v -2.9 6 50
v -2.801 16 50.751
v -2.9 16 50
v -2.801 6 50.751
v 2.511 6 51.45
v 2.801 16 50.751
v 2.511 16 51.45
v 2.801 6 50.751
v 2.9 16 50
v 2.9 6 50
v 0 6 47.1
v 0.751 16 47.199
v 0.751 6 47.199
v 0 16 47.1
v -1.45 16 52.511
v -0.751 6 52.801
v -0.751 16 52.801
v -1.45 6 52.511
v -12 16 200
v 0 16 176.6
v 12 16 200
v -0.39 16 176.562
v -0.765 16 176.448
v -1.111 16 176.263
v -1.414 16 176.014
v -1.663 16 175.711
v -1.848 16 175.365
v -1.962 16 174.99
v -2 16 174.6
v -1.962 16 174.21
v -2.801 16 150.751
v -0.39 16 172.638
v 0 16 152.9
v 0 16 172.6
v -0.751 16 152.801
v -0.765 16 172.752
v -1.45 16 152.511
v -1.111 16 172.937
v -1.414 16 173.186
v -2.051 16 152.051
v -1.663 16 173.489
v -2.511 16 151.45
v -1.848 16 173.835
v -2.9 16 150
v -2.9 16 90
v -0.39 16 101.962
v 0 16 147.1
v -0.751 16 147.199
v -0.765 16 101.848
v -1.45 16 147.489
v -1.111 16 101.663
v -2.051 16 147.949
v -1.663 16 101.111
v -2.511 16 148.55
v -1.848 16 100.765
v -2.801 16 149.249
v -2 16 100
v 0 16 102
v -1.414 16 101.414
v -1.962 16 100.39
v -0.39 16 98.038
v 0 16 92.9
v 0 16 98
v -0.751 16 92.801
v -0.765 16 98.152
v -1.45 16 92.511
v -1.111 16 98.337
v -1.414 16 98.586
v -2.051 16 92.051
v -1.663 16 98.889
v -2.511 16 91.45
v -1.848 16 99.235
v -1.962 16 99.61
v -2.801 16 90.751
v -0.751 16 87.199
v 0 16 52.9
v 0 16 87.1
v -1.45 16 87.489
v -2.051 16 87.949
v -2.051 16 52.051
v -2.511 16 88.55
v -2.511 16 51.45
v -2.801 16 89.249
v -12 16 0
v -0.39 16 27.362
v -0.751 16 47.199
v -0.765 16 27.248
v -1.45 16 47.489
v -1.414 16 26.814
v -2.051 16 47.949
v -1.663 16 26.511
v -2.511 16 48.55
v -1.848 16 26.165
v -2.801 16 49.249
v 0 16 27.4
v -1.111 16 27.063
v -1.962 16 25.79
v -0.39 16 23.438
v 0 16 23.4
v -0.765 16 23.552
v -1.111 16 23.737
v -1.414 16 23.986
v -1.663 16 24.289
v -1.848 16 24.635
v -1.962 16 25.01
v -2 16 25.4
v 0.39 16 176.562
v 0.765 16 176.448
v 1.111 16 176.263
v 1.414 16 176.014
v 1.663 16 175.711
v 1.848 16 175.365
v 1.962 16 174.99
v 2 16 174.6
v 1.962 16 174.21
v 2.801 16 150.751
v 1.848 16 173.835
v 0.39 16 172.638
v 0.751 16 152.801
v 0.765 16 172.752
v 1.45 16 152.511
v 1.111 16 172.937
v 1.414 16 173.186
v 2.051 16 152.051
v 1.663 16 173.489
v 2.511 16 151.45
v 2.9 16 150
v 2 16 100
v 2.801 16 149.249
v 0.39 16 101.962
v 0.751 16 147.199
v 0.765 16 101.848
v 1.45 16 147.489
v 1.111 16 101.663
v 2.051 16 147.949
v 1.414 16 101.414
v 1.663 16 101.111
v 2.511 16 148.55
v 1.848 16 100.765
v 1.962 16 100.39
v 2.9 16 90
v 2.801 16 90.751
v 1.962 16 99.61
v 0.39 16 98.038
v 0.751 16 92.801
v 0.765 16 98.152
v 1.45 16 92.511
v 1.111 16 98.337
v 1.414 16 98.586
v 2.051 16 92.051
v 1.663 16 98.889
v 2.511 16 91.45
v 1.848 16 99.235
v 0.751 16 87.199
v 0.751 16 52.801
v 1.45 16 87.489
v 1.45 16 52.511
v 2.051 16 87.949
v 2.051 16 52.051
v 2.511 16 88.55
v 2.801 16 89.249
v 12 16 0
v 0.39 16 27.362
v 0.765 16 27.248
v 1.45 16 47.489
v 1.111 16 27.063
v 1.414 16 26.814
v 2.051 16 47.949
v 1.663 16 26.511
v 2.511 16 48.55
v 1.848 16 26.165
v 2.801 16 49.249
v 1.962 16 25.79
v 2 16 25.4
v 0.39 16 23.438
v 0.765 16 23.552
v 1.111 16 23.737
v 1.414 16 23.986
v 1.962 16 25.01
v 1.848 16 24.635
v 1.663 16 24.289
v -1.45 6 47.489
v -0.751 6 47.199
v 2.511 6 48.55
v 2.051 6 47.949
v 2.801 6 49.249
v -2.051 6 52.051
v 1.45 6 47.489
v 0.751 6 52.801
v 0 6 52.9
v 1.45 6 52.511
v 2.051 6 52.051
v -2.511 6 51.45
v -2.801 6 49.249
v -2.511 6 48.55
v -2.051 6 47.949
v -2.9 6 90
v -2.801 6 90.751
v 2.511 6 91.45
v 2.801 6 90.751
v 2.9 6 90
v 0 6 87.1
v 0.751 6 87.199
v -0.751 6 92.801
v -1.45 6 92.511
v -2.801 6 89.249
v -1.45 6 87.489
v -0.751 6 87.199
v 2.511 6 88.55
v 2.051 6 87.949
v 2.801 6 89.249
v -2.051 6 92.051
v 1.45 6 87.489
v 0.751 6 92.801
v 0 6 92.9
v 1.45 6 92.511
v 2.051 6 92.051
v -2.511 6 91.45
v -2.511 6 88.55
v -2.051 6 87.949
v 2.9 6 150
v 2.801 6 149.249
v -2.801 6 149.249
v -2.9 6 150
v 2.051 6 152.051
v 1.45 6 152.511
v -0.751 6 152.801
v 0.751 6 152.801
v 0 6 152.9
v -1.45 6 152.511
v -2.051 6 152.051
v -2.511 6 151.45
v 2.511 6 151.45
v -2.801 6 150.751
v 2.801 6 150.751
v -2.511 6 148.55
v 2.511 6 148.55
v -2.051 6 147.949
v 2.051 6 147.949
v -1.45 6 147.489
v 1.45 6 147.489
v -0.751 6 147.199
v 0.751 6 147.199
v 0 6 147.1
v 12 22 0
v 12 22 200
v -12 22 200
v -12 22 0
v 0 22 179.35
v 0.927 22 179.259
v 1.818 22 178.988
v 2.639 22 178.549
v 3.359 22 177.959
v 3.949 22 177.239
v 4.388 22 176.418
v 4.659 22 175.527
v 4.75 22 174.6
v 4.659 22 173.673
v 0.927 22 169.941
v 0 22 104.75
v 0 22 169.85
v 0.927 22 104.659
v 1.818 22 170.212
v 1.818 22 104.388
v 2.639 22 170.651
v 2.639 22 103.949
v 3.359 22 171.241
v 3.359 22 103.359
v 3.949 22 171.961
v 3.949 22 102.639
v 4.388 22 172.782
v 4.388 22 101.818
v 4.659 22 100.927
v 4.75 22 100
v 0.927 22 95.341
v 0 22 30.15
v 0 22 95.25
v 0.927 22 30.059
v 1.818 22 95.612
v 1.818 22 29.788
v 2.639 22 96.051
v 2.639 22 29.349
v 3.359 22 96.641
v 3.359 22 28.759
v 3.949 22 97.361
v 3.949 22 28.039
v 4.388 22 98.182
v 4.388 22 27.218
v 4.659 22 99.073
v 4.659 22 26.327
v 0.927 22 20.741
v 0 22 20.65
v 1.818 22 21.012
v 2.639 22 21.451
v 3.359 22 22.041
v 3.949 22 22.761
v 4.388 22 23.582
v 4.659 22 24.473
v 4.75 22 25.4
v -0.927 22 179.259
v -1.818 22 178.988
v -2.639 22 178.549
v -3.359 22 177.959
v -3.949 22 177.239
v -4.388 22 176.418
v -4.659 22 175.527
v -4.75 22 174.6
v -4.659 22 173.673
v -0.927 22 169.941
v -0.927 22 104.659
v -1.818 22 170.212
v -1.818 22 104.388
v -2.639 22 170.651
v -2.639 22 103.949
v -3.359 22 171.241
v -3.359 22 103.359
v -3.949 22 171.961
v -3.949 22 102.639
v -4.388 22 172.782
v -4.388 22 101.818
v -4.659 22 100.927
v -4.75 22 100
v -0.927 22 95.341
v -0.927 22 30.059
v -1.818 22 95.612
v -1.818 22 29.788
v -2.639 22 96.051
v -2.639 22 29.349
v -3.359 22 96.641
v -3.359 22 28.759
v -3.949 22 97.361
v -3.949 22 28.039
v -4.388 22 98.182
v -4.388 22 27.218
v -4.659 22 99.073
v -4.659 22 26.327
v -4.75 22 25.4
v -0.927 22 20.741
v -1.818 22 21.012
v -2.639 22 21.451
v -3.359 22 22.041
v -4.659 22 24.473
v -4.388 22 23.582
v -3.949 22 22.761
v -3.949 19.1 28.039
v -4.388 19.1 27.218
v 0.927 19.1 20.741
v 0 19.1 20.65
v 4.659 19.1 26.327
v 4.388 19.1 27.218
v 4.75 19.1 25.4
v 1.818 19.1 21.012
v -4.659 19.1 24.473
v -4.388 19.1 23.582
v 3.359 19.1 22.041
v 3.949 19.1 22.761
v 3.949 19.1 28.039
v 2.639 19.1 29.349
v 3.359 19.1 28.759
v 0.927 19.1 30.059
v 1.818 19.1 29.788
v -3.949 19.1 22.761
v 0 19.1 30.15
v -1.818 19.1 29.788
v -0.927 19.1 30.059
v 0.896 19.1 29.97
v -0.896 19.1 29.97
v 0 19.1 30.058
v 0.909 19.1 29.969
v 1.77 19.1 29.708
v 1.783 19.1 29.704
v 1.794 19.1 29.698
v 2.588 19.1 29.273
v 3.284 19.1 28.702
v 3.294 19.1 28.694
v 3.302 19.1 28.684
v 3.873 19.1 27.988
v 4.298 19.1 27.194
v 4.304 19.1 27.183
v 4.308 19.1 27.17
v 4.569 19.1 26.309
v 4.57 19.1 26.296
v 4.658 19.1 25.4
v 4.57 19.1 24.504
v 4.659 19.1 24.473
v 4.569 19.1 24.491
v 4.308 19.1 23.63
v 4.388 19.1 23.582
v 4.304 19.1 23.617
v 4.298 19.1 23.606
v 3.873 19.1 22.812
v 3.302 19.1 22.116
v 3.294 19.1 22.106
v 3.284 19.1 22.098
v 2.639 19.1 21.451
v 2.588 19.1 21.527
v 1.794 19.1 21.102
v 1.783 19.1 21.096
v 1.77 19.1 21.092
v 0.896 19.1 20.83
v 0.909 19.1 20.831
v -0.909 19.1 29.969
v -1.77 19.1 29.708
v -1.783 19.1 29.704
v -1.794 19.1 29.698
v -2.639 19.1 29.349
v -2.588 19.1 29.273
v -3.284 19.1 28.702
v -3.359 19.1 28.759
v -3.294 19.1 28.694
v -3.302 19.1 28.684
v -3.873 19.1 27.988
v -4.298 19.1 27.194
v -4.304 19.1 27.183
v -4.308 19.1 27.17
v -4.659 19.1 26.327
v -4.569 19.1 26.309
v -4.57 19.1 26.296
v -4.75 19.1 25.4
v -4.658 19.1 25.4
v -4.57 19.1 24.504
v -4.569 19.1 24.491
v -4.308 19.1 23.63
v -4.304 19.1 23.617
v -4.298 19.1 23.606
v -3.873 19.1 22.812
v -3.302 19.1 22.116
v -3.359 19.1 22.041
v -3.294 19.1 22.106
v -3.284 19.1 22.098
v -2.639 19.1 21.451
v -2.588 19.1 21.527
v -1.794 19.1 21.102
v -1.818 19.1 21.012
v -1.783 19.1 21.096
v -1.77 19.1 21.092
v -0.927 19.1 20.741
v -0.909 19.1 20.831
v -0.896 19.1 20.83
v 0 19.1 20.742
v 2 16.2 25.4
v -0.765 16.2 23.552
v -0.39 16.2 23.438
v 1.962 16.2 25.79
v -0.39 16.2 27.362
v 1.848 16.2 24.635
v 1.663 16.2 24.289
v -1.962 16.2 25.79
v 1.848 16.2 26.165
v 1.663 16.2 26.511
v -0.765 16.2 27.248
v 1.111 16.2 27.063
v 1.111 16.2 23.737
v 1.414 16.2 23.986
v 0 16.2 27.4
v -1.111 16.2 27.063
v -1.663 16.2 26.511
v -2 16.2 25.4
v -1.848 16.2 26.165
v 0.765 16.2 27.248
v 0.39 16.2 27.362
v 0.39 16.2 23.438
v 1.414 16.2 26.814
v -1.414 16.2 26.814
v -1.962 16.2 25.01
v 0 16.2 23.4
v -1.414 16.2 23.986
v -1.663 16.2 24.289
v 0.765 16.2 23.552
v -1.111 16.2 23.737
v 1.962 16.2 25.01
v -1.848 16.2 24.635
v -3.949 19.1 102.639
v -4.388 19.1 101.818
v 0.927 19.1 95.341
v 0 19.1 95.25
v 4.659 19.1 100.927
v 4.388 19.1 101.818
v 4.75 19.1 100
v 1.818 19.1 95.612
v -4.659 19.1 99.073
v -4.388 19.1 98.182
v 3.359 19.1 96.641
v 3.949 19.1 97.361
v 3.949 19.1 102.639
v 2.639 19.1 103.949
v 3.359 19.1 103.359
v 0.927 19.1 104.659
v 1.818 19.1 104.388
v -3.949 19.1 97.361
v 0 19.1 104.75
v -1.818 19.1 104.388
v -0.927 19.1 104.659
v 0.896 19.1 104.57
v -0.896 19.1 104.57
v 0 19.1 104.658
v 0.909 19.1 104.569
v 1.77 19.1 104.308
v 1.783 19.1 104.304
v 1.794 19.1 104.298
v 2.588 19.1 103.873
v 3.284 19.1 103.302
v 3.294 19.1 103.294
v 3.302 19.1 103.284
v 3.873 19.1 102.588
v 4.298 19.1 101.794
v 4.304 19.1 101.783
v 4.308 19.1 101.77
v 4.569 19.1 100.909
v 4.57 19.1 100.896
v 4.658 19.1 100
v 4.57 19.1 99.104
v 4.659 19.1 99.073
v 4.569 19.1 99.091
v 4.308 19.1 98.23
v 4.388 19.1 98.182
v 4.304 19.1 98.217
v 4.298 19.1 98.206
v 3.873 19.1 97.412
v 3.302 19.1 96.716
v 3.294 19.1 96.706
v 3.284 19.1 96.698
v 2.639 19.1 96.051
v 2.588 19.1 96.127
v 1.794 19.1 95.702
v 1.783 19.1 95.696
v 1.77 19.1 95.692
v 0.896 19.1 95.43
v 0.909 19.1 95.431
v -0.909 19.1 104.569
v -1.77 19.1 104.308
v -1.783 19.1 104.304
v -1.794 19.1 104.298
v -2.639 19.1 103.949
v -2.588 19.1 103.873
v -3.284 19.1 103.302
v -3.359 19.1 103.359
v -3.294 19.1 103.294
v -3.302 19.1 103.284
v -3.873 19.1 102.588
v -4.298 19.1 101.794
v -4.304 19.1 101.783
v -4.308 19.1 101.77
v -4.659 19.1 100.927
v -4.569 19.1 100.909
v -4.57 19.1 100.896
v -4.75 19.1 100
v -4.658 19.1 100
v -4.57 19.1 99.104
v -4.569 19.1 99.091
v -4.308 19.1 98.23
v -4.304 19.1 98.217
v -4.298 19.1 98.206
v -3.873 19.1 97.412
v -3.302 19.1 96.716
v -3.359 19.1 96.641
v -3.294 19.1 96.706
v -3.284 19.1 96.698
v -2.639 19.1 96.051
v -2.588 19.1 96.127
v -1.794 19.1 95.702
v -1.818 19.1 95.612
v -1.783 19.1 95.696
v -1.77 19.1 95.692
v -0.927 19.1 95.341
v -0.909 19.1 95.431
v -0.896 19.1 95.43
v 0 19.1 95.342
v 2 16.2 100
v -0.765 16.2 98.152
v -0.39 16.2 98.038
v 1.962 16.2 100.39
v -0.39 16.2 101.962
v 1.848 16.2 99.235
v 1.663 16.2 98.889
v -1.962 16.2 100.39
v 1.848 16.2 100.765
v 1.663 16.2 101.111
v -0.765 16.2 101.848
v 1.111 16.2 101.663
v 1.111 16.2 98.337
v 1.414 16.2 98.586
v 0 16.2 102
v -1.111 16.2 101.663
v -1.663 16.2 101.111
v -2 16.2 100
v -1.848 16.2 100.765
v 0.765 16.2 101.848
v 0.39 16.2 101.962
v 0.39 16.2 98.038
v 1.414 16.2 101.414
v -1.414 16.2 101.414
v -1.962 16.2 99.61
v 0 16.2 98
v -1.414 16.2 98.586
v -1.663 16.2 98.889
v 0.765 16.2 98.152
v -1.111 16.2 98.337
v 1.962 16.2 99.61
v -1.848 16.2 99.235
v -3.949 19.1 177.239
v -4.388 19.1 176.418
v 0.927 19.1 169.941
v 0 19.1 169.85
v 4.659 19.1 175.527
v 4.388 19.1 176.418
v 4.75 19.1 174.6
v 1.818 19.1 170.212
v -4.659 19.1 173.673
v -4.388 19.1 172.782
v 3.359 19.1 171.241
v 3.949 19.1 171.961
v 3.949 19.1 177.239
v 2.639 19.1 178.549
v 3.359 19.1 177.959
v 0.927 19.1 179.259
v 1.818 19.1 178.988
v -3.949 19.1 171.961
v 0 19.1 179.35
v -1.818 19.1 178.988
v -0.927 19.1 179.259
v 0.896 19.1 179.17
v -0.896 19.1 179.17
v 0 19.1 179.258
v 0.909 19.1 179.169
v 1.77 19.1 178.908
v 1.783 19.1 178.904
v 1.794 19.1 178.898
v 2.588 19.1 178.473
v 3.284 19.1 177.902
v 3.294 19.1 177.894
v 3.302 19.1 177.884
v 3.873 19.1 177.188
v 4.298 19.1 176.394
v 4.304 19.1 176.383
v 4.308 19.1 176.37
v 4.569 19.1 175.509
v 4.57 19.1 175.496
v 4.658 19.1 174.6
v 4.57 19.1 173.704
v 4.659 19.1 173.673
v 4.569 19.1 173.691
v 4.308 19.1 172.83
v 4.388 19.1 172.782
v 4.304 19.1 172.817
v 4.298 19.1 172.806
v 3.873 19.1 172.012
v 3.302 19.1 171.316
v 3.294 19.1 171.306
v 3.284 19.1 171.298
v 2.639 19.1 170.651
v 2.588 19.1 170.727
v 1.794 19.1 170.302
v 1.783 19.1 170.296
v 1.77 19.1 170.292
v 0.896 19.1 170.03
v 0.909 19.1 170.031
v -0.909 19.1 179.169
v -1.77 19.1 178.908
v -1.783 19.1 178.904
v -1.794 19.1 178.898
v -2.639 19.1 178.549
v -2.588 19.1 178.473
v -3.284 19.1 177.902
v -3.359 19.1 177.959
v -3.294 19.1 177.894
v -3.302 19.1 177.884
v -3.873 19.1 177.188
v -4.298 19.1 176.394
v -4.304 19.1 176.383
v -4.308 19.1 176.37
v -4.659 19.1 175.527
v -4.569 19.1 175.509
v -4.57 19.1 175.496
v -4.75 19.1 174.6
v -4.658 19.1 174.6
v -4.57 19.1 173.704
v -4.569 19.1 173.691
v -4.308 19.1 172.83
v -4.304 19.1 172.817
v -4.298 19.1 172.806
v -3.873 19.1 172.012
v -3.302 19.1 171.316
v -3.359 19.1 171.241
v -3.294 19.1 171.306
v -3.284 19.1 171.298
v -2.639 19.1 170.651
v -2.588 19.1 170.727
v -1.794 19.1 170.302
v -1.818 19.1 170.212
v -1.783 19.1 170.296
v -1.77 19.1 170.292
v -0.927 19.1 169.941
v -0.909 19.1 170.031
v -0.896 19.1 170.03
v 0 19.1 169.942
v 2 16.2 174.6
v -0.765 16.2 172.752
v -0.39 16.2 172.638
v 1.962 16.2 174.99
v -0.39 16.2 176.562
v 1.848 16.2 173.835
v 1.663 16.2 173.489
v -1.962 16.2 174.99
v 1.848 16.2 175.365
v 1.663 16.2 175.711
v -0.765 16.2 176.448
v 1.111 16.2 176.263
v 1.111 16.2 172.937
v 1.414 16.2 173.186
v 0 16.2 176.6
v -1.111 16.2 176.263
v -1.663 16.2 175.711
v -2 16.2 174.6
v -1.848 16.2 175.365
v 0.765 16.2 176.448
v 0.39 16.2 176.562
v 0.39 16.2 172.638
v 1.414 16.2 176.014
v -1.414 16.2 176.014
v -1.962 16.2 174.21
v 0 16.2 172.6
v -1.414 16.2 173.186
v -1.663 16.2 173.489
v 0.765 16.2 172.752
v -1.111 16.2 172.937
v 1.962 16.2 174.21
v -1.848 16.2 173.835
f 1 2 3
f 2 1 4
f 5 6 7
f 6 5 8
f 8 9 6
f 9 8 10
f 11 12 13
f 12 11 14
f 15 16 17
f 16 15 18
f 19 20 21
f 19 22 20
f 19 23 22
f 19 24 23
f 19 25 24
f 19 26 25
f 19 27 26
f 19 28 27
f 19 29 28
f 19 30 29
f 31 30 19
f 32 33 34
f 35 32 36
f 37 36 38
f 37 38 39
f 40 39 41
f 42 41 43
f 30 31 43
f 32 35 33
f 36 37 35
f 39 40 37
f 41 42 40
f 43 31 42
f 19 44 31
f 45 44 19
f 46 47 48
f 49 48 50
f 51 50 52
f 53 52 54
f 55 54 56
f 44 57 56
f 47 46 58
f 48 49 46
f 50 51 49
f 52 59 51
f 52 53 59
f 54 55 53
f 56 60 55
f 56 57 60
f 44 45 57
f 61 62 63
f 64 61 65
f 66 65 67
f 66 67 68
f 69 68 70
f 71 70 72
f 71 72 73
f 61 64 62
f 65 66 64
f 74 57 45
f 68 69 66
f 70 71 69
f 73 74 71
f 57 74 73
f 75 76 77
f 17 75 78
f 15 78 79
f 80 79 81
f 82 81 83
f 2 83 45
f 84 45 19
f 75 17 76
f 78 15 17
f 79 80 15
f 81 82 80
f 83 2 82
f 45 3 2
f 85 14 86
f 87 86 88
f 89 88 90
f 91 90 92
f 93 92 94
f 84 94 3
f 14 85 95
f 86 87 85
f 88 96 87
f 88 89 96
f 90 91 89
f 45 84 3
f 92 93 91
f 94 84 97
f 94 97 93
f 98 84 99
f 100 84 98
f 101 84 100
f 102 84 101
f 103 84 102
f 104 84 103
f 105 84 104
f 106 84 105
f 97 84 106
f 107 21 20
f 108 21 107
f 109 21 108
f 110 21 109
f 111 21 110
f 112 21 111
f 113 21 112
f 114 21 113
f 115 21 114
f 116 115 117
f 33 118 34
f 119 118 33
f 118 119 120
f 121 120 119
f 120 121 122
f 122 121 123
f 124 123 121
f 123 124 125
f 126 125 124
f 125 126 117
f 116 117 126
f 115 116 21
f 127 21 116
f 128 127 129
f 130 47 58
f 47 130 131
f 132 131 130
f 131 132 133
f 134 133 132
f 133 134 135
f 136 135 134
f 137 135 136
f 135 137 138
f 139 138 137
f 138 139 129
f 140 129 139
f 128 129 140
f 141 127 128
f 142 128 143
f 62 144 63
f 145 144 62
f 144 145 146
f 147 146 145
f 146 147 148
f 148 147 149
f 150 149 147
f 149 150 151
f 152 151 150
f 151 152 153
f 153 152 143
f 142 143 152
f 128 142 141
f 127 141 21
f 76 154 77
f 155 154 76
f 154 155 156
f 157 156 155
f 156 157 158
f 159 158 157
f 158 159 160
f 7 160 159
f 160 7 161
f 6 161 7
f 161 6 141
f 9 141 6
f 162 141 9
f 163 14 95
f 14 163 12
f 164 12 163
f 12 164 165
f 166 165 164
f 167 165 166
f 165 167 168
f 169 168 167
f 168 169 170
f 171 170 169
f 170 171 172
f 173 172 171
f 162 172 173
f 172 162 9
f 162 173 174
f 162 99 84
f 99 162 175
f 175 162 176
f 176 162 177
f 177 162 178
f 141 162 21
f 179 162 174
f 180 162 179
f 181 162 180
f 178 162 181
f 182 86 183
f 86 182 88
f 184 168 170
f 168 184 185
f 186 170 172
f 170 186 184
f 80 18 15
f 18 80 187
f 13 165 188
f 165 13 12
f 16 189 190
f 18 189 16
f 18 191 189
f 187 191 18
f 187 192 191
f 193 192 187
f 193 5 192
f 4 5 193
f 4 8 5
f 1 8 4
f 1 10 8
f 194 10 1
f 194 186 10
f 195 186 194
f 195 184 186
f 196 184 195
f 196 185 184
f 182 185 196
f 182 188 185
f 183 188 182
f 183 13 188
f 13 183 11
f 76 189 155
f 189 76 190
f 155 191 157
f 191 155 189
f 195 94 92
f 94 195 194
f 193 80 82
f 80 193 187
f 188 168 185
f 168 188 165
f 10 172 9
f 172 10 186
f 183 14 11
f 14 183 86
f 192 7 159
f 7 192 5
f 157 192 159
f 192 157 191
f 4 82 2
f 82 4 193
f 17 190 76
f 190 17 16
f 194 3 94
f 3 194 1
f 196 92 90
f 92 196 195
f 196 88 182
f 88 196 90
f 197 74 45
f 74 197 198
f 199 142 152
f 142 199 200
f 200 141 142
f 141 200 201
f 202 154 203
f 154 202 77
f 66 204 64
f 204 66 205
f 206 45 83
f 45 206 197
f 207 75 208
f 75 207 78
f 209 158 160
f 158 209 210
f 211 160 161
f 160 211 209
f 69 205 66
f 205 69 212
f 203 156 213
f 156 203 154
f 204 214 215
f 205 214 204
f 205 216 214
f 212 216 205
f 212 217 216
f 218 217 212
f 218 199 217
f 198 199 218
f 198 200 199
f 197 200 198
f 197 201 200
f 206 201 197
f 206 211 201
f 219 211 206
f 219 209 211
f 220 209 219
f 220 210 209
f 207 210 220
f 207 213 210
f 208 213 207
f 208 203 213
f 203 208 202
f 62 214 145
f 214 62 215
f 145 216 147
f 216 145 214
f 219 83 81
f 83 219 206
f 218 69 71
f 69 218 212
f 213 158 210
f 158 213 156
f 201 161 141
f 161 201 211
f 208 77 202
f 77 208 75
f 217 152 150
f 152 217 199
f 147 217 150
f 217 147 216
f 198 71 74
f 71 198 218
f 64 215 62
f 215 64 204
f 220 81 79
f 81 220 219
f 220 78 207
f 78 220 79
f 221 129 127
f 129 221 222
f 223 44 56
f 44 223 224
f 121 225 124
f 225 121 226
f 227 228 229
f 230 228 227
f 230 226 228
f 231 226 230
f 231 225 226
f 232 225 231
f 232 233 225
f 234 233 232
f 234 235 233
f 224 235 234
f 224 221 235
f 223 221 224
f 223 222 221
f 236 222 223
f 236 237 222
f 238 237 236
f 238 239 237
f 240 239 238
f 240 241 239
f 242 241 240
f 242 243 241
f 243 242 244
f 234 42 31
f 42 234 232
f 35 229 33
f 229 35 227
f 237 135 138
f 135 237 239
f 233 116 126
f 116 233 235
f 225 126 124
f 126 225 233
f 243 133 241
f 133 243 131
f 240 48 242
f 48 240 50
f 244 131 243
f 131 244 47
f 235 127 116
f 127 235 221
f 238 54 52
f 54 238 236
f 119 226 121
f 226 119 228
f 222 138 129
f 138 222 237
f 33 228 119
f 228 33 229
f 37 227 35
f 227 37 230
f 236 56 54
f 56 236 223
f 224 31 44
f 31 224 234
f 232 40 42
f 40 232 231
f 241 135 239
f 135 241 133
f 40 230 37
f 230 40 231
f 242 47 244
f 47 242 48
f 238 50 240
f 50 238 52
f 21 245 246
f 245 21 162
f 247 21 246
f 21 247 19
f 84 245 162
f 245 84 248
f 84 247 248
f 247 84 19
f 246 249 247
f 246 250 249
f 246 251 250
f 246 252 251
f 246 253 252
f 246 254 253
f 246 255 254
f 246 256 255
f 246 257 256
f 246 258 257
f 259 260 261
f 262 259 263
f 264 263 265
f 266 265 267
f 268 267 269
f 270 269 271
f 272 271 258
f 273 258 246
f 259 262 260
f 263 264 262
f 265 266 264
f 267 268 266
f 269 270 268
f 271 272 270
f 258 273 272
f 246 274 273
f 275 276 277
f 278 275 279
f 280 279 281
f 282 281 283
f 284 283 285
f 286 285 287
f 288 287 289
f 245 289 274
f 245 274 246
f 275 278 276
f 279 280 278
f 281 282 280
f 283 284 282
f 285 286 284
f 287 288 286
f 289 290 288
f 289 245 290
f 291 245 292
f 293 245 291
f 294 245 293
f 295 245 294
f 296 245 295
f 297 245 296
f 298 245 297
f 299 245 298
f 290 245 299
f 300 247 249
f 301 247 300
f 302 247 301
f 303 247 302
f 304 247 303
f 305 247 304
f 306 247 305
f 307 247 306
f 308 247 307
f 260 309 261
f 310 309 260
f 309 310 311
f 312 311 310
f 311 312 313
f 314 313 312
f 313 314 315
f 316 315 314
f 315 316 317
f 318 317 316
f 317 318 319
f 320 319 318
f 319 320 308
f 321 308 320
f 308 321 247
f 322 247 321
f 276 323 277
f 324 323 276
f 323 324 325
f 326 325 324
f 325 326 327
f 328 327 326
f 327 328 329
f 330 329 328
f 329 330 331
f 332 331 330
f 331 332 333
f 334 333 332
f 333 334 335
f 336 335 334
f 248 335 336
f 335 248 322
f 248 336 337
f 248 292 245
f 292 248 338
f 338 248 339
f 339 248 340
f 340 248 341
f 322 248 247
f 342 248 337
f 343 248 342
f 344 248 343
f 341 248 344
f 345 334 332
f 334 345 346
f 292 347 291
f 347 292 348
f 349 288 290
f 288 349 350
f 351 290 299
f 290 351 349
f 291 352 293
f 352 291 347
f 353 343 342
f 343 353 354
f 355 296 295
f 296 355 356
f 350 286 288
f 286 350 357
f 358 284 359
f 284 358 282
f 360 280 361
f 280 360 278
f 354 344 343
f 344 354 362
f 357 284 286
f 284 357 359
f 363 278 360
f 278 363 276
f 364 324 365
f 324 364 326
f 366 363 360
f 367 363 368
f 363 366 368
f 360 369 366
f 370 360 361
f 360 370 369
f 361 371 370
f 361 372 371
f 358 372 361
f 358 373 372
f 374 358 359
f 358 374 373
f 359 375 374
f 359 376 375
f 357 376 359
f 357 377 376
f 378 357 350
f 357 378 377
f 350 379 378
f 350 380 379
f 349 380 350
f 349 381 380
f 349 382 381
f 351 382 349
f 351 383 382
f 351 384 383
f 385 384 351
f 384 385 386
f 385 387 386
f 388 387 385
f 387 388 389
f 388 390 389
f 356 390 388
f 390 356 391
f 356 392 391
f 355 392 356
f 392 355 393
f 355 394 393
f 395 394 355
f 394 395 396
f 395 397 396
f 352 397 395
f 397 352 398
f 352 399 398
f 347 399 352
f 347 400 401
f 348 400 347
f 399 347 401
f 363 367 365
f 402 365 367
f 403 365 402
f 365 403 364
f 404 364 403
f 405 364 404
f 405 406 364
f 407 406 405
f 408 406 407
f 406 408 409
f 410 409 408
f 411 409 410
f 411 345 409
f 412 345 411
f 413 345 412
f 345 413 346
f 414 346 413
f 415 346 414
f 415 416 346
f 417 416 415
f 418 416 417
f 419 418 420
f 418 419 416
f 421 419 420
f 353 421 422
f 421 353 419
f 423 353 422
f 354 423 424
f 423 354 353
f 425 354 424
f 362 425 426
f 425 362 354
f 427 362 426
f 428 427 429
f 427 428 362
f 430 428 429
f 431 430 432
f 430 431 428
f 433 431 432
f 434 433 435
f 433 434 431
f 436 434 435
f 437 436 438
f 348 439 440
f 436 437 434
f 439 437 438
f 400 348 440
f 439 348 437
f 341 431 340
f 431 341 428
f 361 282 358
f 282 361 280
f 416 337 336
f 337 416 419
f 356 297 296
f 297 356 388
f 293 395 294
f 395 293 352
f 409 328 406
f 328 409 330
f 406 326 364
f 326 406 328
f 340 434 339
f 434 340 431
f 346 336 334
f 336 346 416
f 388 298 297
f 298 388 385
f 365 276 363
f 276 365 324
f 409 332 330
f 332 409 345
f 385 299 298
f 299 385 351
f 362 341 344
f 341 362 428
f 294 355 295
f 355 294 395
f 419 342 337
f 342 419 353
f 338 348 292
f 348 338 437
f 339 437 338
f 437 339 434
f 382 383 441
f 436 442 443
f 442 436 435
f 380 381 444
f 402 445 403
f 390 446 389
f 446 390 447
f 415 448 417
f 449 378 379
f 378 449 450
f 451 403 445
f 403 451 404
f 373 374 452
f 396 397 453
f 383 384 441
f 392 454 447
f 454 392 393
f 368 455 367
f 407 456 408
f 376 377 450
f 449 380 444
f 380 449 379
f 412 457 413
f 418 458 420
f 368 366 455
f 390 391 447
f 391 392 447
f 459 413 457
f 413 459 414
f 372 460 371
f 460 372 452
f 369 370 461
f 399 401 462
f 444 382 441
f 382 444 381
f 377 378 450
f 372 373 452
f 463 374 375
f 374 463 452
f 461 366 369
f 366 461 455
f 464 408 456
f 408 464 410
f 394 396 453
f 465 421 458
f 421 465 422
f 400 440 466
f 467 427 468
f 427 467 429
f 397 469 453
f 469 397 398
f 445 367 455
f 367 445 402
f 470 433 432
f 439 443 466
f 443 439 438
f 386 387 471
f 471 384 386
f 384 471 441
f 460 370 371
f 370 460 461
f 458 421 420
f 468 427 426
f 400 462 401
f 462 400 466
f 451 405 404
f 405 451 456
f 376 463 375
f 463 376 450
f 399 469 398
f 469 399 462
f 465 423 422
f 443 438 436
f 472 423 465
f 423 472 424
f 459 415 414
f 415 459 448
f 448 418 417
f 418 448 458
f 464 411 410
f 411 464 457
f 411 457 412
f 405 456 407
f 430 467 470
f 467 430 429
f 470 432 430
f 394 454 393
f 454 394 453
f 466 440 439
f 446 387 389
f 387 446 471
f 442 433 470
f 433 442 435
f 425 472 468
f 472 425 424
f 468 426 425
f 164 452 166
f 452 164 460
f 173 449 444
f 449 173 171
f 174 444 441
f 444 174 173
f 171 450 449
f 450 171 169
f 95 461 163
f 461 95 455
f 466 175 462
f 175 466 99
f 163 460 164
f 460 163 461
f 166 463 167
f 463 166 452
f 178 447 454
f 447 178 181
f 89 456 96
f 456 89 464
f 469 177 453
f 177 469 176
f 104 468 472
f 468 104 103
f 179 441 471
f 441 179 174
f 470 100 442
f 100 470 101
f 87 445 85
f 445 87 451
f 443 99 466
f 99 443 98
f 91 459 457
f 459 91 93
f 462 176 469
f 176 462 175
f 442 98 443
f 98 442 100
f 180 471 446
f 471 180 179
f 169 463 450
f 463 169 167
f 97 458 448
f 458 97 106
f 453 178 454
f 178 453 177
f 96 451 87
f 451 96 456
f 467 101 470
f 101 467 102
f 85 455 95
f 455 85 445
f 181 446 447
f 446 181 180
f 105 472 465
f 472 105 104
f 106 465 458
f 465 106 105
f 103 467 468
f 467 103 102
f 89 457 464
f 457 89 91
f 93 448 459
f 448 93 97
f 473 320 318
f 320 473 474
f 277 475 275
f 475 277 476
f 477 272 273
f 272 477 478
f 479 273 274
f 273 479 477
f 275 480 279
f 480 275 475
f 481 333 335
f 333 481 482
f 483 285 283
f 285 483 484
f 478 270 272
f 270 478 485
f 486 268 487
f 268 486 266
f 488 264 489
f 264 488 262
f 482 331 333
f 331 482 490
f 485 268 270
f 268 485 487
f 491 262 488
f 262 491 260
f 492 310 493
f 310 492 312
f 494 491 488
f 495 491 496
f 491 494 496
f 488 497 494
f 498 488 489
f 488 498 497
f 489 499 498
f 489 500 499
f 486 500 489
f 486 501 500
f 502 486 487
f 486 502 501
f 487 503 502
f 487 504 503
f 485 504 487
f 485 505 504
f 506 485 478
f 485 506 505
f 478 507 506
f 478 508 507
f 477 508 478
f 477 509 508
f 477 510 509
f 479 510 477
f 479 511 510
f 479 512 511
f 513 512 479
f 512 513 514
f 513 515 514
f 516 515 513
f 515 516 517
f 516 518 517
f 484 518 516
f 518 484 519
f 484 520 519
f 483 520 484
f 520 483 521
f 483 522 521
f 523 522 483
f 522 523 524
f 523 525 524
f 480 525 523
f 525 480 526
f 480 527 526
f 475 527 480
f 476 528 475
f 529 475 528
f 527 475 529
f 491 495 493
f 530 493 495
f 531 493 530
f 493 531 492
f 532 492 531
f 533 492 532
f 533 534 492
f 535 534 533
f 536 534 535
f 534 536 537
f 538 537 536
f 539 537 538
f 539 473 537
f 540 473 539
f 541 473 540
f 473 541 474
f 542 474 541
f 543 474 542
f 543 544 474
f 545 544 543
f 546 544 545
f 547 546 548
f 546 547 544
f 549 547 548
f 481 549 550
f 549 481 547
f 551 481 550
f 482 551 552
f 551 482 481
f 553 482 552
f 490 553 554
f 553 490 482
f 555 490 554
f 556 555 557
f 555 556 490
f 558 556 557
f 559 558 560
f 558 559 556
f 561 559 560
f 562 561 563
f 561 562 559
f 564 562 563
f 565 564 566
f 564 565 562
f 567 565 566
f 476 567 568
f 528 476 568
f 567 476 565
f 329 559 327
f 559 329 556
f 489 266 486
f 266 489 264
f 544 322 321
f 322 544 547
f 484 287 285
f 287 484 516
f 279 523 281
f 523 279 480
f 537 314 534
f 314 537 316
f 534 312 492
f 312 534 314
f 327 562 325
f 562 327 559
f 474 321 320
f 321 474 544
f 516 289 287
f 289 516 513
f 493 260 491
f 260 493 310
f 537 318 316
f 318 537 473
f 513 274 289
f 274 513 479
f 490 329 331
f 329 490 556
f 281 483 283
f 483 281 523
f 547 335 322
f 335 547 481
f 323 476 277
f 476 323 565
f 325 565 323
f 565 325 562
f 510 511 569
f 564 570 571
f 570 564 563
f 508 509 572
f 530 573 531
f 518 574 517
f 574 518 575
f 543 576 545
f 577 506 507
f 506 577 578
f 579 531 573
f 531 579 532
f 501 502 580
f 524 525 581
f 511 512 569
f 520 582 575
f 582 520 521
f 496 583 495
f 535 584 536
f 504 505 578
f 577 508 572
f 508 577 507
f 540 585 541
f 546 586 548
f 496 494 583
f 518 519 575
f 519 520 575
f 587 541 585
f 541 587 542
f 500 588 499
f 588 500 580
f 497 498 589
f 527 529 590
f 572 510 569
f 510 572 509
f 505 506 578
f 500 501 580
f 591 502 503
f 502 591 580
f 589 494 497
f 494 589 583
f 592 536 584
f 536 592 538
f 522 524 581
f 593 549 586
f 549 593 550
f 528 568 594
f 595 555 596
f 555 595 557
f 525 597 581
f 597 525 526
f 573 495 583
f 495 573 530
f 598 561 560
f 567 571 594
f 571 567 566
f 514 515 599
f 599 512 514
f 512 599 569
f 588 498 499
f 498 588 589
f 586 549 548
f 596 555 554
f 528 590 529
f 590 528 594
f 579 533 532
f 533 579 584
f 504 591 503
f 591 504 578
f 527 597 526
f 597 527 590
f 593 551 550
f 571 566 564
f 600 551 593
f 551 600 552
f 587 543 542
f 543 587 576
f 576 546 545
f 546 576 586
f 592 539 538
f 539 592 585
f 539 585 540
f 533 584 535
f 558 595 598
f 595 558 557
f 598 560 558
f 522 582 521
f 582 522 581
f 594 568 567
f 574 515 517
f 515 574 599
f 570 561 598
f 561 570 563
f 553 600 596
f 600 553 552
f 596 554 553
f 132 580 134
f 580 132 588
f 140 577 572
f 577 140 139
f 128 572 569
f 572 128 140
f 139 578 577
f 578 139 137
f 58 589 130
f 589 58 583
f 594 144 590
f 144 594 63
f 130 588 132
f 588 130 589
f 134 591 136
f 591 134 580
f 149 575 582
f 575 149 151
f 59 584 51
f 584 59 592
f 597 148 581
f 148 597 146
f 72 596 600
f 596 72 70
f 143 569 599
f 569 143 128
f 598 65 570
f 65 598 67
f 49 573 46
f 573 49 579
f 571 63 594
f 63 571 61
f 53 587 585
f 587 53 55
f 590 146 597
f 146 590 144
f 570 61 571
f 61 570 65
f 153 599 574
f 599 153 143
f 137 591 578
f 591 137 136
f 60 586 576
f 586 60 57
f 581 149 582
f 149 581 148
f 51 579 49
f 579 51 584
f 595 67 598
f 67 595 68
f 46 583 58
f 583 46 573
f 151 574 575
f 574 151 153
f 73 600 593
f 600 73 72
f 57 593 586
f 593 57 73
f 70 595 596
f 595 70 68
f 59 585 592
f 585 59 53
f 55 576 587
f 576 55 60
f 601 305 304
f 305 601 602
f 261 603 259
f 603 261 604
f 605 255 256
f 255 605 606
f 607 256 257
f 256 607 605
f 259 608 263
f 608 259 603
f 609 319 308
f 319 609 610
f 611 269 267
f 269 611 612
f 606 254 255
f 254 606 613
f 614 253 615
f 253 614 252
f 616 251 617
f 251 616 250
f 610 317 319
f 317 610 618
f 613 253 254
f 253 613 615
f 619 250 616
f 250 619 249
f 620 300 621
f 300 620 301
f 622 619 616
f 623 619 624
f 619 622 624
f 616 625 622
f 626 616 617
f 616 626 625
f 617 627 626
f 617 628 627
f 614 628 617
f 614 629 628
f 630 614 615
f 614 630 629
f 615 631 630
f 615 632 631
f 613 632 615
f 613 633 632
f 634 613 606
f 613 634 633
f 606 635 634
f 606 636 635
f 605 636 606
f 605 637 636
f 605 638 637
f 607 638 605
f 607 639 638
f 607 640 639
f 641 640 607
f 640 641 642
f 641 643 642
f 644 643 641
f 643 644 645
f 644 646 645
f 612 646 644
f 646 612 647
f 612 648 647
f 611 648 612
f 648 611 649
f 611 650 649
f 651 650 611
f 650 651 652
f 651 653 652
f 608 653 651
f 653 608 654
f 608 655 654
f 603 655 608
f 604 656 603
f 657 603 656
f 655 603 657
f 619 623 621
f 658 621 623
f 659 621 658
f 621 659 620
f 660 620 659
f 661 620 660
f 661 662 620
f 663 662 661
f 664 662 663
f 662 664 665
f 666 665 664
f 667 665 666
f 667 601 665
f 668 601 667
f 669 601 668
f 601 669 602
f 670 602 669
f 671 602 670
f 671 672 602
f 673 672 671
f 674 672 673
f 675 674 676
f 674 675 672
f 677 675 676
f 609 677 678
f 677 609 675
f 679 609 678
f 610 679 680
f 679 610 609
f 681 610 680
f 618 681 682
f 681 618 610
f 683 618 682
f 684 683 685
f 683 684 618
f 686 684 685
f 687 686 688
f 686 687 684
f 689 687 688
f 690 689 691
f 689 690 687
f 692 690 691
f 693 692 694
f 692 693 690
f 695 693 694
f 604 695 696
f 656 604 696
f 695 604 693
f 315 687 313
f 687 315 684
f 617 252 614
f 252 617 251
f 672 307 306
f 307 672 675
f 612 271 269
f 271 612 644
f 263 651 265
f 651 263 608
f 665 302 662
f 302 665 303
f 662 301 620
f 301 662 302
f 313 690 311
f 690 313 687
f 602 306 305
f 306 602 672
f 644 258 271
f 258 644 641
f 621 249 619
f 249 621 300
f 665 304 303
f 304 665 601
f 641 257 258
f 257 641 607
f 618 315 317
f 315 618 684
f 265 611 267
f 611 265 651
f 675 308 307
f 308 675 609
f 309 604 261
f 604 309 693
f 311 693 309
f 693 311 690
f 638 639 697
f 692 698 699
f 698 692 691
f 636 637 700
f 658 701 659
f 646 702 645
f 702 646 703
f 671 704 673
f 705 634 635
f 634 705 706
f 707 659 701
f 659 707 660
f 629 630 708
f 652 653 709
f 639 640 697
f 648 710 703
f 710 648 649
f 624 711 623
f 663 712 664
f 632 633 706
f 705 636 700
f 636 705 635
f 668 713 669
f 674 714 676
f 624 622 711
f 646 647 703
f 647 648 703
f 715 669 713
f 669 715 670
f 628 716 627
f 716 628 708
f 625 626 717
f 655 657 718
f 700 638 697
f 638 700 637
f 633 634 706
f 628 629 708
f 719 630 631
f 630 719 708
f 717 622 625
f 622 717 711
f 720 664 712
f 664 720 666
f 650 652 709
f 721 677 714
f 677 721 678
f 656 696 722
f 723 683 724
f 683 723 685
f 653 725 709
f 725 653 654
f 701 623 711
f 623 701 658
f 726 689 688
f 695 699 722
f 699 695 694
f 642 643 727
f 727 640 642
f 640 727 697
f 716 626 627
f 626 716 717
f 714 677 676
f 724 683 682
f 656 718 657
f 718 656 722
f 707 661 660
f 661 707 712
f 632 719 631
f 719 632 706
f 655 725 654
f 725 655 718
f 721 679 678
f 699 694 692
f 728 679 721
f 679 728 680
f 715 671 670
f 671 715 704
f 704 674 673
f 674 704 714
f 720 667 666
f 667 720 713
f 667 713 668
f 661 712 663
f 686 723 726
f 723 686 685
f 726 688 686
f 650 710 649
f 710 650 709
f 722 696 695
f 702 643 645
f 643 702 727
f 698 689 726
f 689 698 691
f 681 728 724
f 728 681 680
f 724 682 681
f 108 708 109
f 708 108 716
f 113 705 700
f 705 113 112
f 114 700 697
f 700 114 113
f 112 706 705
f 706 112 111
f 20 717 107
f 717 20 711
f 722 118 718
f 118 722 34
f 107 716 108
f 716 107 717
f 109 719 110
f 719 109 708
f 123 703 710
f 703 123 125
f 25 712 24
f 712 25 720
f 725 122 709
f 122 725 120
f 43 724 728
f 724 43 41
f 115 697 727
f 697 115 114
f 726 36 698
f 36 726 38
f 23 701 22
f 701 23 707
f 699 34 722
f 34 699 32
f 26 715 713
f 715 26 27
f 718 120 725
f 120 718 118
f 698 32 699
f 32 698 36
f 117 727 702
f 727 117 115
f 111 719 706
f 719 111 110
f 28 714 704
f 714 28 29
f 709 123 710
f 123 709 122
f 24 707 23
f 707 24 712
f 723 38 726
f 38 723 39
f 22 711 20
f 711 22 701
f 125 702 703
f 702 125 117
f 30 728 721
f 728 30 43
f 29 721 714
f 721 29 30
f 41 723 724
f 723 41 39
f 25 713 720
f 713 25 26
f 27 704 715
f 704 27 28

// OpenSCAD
// PROJECT: 5kg Vertical Panel Actuator
// PART 2: Top Track (Modified with 3mm Deep Recess)

segment_length = 200; 
top_width = 24;         
web_width = 12.4;       
top_flange_thick = 6;

difference() {
    union() {
        // --- ORIGINAL GEOMETRY ---
        // Top Slider Surface
        translate([-top_width/2, 16, 0]) 
            cube([top_width, top_flange_thick, segment_length]);
            
        // Upper half of Central Web
        translate([-web_width/2, 16.0, 0]) 
            cube([web_width, 1, segment_length]);

// 5.8mm DOWELs - 5x Deeper (25mm)
for(z = [50, 90, 150]) {
    translate([0, 16.0, z]) 
        rotate([90, 0, 0]) 
        cylinder(d=5.8, h=10, $fn=24);
}
    }

    // --- NEW: DEEP MOUNTING HOLES ---
    for(z = [25.4, 100, 174.6]) {
        translate([0, 22.1, z]) rotate([90, 0, 0]) {
            
            // 1. Main 4mm Through Hole
            cylinder(d=4, h=30, $fn=32); 
            
            // 2. Extra Deep Recess
            // This creates a 3mm deep straight 'well' before the chamfer starts
            // to ensure the head is buried 3mm below the top surface.
            translate([0, 0, -0.1]) {
                // Straight side-wall for the first 3mm
                cylinder(d=9.5, h=3.1, $fn=32);
                // The actual conical chamfer starting 3mm down
                translate([0,0,3]) cylinder(d1=9.5, d2=4, h=3, $fn=32);
            }
        }
    }
}
